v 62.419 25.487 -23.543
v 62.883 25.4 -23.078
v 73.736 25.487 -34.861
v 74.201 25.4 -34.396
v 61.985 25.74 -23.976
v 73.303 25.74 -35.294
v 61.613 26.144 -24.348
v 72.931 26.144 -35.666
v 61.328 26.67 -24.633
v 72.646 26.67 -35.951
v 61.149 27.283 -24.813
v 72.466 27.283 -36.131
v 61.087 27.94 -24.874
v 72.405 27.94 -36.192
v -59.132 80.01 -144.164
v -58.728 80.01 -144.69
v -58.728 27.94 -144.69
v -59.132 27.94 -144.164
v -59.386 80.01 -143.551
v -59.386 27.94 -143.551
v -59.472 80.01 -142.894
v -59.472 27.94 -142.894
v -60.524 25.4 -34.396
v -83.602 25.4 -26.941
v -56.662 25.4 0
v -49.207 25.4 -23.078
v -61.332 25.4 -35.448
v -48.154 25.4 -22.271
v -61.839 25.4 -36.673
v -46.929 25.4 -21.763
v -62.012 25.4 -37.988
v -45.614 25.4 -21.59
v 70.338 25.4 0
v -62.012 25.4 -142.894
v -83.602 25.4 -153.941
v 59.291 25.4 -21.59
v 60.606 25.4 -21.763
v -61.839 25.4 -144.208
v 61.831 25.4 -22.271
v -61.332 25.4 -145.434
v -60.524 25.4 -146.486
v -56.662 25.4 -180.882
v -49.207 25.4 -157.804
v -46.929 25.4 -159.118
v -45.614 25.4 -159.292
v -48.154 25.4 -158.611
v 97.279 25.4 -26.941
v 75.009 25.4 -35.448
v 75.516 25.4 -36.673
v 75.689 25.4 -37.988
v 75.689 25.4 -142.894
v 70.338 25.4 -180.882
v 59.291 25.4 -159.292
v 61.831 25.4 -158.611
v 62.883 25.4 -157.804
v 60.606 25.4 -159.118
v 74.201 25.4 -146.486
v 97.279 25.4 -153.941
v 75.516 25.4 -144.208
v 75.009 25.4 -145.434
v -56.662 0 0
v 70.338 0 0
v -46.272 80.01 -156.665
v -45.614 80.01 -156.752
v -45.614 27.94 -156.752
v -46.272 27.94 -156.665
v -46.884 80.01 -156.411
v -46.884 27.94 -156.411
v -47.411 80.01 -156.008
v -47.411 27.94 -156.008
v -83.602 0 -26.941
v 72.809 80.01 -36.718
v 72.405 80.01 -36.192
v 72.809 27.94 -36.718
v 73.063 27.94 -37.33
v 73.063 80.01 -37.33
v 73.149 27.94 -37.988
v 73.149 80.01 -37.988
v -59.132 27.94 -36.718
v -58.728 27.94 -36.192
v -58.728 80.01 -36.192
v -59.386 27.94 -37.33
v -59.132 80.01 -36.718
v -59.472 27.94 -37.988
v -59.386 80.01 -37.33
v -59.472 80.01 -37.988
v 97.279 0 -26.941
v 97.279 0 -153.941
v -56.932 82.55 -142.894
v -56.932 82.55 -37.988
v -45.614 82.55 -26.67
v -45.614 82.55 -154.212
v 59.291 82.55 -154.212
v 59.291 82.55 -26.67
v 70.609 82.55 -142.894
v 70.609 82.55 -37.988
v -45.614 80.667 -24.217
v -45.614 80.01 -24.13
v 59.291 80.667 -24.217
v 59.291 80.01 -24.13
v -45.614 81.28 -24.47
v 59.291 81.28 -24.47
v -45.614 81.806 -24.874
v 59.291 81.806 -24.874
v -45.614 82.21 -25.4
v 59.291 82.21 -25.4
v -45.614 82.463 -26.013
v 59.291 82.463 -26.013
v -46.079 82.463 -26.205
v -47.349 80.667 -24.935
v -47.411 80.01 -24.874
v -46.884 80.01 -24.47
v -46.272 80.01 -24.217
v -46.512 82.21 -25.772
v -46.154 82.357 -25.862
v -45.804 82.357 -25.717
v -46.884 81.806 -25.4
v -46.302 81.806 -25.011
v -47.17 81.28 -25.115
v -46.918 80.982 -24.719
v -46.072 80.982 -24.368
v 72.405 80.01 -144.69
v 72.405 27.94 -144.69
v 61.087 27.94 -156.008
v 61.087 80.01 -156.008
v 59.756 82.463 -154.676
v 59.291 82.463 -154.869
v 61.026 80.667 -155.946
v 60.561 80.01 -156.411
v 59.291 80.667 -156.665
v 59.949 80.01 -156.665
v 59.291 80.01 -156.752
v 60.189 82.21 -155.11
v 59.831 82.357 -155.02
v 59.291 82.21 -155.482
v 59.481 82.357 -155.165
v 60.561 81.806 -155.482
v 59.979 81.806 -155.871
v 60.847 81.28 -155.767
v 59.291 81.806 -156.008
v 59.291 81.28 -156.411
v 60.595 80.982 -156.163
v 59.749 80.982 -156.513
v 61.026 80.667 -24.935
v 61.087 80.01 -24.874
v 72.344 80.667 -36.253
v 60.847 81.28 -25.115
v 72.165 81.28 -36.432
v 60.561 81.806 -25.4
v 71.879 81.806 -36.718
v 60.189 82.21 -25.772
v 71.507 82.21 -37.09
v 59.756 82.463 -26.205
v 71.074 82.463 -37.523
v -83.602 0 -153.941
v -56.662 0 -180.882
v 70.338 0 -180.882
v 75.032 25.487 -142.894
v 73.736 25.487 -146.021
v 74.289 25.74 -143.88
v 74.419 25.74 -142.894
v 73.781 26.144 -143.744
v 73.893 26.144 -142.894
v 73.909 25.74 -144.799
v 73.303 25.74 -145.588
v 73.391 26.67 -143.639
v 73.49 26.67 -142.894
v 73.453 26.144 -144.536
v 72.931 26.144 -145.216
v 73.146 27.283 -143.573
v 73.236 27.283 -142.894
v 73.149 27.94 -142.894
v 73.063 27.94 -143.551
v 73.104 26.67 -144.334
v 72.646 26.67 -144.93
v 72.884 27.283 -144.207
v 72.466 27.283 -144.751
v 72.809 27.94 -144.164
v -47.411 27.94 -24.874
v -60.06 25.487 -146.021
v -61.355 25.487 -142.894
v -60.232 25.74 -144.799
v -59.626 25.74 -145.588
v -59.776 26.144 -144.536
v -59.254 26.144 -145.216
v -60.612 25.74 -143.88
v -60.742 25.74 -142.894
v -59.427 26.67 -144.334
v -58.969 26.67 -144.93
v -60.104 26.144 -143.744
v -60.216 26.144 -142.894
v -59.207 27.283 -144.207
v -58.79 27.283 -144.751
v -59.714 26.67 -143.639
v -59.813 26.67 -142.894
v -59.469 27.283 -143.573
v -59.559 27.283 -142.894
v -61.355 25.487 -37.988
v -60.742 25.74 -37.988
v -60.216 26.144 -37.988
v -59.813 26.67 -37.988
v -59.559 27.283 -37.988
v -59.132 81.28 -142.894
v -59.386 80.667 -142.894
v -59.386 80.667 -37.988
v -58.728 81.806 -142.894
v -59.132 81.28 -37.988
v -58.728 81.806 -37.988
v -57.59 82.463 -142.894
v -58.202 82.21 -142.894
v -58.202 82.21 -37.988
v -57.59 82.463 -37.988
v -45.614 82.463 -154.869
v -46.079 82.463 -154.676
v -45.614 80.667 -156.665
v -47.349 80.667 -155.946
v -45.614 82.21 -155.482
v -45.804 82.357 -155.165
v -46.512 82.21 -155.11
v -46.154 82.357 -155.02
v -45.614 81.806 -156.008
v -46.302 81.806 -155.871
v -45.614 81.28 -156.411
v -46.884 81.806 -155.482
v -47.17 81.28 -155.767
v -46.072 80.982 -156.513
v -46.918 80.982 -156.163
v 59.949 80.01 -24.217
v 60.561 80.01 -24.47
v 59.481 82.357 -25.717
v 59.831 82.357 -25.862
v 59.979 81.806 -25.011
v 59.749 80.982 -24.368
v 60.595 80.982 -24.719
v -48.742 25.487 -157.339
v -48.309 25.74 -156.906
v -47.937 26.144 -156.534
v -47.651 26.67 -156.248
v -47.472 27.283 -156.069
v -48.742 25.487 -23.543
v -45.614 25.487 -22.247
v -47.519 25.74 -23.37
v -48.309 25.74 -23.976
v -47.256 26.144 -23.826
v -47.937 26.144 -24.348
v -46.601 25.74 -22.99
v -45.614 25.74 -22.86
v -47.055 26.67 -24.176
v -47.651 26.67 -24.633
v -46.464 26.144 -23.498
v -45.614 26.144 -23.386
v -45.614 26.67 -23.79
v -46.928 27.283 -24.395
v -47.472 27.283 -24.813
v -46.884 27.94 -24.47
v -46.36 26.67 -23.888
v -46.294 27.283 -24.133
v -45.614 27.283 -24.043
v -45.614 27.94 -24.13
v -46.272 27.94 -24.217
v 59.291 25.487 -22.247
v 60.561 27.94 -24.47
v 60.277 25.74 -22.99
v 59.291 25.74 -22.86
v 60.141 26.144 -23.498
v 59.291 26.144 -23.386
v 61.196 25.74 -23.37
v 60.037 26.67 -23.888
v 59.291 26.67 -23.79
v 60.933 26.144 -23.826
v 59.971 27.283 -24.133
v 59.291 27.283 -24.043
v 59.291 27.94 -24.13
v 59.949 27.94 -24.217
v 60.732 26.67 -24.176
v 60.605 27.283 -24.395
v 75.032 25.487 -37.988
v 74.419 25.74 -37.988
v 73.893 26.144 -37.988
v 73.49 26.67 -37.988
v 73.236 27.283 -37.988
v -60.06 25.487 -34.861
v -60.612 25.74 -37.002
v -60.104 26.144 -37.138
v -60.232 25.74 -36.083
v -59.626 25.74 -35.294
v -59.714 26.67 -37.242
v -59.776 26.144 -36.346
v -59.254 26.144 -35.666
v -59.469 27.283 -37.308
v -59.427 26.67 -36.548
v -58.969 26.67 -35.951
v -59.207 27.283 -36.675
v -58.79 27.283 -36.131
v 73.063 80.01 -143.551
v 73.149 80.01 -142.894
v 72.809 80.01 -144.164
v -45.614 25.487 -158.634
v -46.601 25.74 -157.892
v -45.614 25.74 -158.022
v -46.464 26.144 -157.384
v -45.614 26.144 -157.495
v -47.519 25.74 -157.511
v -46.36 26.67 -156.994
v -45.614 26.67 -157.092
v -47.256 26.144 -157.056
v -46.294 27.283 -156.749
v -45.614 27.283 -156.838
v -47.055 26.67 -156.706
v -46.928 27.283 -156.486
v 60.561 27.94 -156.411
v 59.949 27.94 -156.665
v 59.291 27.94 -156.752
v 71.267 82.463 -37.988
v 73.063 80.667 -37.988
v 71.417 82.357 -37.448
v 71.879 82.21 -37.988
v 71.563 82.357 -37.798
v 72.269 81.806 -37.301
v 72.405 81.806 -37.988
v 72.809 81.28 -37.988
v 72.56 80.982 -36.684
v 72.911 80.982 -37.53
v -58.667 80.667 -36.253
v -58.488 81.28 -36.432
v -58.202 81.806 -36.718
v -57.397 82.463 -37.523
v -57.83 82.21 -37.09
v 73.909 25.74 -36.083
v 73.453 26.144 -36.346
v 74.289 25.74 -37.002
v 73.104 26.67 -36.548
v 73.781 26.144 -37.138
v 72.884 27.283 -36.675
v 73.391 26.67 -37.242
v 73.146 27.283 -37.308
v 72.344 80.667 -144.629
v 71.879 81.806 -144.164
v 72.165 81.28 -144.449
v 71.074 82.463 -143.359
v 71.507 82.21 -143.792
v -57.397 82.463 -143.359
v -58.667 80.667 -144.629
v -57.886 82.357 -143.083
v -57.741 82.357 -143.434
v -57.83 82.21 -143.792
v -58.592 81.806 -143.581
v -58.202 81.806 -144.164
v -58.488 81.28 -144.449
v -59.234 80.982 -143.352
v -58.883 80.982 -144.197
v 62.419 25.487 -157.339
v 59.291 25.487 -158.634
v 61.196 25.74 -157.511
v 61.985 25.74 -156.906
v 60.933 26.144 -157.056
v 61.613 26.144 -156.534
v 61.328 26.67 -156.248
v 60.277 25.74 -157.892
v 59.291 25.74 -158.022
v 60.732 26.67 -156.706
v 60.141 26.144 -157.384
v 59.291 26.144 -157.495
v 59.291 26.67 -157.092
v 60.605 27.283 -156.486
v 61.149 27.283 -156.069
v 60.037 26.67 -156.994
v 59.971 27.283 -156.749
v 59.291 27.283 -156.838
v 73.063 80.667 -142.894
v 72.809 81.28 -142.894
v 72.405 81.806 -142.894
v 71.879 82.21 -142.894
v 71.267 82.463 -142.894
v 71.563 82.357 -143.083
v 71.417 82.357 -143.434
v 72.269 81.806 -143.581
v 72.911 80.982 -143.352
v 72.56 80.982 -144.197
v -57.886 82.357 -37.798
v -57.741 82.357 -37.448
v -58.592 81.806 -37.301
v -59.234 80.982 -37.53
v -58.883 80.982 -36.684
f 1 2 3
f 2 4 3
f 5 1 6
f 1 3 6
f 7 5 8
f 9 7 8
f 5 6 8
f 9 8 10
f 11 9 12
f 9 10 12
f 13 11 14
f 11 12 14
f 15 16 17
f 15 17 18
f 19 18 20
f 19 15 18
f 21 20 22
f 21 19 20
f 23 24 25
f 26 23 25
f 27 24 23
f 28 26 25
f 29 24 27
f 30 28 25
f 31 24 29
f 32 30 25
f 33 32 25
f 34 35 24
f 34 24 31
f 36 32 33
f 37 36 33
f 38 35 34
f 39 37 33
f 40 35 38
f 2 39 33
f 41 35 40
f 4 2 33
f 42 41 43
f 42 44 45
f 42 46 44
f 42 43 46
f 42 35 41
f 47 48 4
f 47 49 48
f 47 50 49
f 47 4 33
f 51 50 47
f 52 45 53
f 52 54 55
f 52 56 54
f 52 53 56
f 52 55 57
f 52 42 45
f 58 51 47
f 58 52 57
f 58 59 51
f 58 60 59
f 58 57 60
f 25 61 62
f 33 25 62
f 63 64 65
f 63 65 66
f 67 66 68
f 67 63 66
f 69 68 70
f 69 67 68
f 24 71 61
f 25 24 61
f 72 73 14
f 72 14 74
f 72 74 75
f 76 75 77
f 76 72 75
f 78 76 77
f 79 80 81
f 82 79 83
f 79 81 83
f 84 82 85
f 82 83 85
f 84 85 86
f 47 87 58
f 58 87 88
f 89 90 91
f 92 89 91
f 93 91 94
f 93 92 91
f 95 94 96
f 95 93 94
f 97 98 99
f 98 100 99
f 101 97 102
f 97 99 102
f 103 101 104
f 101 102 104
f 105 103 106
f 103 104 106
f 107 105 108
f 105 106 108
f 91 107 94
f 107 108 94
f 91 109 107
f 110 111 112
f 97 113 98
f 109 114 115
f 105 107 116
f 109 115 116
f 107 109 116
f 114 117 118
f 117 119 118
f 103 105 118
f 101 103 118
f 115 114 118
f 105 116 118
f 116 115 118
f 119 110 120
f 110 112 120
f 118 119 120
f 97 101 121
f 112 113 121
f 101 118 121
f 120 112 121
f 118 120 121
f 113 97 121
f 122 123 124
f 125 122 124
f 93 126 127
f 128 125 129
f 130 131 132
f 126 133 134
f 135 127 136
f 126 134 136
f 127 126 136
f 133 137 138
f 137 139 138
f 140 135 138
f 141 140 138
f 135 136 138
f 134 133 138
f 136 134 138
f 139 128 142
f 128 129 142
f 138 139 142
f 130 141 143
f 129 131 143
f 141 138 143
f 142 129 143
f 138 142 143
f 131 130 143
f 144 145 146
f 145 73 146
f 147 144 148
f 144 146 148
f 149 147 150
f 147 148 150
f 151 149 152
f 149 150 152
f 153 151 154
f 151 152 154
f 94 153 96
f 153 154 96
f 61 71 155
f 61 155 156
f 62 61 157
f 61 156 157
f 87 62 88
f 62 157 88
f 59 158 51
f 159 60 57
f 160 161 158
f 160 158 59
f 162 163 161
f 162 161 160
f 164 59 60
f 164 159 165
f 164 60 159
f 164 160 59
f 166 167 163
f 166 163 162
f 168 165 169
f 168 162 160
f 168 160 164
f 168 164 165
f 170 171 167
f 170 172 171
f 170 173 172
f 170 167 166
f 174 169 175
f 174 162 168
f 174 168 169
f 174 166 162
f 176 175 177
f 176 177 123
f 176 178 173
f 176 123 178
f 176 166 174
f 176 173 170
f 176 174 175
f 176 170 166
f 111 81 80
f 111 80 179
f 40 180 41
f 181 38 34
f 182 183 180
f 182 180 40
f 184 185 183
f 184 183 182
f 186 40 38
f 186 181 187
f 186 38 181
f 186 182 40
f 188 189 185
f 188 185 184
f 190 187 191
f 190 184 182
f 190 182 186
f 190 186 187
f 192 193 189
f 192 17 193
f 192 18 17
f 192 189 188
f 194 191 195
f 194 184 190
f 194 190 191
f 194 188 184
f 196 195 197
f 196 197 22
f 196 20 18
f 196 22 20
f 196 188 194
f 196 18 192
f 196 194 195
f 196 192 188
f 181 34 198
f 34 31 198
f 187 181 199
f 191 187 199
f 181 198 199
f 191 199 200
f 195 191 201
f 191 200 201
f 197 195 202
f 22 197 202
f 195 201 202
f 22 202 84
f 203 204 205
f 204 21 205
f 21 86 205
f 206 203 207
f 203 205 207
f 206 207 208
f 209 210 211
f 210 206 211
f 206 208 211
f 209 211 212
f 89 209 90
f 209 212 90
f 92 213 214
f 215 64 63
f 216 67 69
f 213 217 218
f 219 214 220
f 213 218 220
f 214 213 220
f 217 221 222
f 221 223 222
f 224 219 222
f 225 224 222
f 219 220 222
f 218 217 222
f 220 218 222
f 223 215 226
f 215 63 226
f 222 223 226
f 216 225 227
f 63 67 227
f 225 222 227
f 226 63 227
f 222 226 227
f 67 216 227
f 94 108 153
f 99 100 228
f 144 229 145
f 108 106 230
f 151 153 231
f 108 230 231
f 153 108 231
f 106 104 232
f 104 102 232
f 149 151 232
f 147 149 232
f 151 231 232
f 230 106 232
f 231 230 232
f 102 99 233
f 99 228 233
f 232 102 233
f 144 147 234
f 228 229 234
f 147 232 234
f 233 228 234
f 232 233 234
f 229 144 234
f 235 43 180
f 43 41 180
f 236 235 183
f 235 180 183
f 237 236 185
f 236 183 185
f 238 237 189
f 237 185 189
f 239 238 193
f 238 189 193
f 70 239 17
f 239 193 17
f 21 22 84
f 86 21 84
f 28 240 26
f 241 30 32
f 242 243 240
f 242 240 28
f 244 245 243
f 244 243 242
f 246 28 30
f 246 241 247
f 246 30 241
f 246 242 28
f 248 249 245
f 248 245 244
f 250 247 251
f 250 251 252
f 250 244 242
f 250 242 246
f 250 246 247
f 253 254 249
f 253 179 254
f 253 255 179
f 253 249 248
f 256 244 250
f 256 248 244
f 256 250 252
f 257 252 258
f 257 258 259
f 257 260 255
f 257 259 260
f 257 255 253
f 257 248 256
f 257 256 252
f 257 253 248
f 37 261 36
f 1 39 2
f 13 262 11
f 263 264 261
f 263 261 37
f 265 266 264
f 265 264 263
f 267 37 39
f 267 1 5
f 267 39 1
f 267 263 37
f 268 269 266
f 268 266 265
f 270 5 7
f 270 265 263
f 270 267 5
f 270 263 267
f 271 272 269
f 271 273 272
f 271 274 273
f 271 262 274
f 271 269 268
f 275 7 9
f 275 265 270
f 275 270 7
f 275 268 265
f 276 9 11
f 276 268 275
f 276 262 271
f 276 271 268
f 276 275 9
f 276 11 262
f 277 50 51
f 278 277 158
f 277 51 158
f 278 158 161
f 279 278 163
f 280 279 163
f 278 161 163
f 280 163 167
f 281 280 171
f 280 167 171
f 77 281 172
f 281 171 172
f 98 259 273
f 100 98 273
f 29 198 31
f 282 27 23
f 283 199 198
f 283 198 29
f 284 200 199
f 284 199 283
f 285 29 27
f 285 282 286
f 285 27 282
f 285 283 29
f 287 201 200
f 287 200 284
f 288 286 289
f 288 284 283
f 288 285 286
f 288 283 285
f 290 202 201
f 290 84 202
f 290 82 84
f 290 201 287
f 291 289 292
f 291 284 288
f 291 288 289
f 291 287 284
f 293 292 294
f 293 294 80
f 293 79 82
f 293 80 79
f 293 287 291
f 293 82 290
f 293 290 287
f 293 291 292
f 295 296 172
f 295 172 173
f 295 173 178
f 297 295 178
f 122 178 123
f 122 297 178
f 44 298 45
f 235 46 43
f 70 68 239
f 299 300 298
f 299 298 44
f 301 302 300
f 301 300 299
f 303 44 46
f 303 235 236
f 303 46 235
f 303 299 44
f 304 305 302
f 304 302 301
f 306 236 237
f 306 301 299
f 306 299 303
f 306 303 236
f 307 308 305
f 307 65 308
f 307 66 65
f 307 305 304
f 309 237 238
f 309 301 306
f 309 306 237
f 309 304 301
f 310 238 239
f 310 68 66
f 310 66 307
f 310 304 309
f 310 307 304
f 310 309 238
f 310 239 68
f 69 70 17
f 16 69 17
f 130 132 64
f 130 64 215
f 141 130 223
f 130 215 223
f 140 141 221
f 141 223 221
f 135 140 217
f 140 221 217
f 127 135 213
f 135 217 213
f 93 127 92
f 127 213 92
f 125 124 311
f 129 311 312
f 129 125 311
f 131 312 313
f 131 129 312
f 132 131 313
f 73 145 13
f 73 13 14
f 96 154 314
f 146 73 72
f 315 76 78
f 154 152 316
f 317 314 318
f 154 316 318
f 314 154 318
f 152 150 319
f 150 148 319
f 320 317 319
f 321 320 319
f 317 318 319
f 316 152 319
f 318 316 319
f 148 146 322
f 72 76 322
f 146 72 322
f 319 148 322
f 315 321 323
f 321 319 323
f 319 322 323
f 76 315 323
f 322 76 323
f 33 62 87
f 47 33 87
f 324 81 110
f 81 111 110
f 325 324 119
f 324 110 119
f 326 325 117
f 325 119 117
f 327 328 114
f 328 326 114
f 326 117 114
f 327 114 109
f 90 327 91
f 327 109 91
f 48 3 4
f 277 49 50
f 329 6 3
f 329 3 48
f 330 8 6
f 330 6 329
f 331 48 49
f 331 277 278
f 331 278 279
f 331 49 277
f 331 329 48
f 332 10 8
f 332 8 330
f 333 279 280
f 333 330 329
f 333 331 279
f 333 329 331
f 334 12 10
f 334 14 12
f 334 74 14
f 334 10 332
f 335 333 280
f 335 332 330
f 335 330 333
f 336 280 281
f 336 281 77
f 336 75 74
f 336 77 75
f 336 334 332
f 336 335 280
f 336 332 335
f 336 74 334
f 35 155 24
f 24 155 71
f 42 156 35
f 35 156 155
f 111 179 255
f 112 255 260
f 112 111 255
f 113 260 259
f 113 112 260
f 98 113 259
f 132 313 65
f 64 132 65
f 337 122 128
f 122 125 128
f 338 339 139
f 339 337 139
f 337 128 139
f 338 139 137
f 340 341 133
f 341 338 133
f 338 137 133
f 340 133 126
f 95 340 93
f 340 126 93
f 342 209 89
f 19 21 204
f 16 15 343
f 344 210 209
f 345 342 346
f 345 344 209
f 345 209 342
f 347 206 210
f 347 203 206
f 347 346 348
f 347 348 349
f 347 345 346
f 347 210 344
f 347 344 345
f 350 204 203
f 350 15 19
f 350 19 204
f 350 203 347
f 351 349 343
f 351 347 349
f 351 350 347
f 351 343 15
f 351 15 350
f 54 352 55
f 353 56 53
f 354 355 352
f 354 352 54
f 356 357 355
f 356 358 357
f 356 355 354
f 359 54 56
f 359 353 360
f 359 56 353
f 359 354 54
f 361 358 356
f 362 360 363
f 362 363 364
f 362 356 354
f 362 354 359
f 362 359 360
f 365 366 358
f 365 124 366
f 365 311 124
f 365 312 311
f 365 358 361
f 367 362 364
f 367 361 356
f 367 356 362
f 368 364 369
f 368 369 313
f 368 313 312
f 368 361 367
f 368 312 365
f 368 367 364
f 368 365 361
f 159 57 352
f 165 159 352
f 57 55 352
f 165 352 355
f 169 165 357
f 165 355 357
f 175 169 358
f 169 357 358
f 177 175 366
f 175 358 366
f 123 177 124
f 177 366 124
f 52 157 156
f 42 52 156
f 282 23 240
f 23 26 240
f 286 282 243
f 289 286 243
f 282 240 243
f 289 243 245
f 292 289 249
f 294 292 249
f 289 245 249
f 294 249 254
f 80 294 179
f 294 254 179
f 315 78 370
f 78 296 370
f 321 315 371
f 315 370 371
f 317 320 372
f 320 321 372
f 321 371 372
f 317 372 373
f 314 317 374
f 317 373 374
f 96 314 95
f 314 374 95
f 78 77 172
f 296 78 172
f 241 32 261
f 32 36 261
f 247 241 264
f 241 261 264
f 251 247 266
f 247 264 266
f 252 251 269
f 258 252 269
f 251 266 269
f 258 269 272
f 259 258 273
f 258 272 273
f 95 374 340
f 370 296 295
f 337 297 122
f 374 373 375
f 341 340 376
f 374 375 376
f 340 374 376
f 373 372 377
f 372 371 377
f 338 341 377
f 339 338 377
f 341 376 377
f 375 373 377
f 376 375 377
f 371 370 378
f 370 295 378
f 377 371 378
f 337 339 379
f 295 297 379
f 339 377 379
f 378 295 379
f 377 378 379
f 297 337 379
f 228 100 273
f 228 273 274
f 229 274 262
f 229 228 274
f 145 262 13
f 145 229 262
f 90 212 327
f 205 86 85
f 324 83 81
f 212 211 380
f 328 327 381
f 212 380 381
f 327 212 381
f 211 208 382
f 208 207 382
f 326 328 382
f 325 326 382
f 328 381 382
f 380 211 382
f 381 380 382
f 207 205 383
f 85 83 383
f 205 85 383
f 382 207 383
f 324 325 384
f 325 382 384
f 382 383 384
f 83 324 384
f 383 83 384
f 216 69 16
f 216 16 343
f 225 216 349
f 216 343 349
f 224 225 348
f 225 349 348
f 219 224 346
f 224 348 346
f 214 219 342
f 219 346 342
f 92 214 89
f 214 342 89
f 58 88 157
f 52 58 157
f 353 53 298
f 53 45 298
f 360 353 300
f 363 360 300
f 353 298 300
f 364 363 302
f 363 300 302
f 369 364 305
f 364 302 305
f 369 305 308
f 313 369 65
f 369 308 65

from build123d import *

# Parameters (mm, degrees)
BOSS_EXTRUDE1_DEPTH = 25.4
BOSS_EXTRUDE2_DEPTH = 57.15
FILLET1_R           = 2.54


with BuildPart() as part:
    # Sketch2 → Boss-Extrude1 (new body)
    with BuildSketch(Plane(origin=(0, 0, 0), x_dir=(1, 0, 0), z_dir=(0, 1, 0))):
        Polygon((-56.661538462, 0), (70.338461538, 0), (97.279229902, 26.940768363), (97.279229902, 153.940768363), (70.338461538, 180.881536726), (-56.661538462, 180.881536726), (-83.602306825, 153.940768363), (-83.602306825, 26.940768363), align=None)
    extrude(amount=BOSS_EXTRUDE1_DEPTH)

    # Sketch3 → Boss-Extrude2 (add)
    with BuildSketch(Plane(origin=(0, 25.4, 0), x_dir=(1, 0, 0), z_dir=(0, 1, 0))):
        Polygon((-59.472306825, 36.935741623), (-46.666565201, 24.13), (60.343488278, 24.13), (73.149229902, 36.935741623), (73.149229902, 143.945795103), (60.343488278, 156.751536726), (-46.666565201, 156.751536726), (-59.472306825, 143.945795103), align=None)
    extrude(amount=BOSS_EXTRUDE2_DEPTH)

    # Fillet1
    fillet1_edges = [part.edges().sort_by_distance(p)[0] for p in [
        (-59.472306825, 25.4, -90.440768363),
        (-59.472306825, 53.975, -143.945795103),
        (-53.069436013, 25.4, -30.532870812),
        (-59.472306825, 53.975, -36.935741623),
        (6.838461538, 25.4, -24.13),
        (-46.666565201, 53.975, -24.13),
        (66.74635909, 25.4, -30.532870812),
        (60.343488278, 53.975, -24.13),
        (73.149229902, 25.4, -90.440768363),
        (73.149229902, 53.975, -36.935741623),
        (66.74635909, 25.4, -150.348665915),
        (73.149229902, 53.975, -143.945795103),
        (6.838461538, 25.4, -156.751536726),
        (60.343488278, 53.975, -156.751536726),
        (-53.069436013, 25.4, -150.348665915),
        (-46.666565201, 53.975, -156.751536726),
        (-59.472306825, 82.55, -90.440768363),
        (-53.069436013, 82.55, -30.532870812),
        (6.838461538, 82.55, -24.13),
        (66.74635909, 82.55, -30.532870812),
        (73.149229902, 82.55, -90.440768363),
        (66.74635909, 82.55, -150.348665915),
        (6.838461538, 82.55, -156.751536726),
        (-53.069436013, 82.55, -150.348665915),
    ]]
    fillet(fillet1_edges, radius=FILLET1_R)


solid = part.part
